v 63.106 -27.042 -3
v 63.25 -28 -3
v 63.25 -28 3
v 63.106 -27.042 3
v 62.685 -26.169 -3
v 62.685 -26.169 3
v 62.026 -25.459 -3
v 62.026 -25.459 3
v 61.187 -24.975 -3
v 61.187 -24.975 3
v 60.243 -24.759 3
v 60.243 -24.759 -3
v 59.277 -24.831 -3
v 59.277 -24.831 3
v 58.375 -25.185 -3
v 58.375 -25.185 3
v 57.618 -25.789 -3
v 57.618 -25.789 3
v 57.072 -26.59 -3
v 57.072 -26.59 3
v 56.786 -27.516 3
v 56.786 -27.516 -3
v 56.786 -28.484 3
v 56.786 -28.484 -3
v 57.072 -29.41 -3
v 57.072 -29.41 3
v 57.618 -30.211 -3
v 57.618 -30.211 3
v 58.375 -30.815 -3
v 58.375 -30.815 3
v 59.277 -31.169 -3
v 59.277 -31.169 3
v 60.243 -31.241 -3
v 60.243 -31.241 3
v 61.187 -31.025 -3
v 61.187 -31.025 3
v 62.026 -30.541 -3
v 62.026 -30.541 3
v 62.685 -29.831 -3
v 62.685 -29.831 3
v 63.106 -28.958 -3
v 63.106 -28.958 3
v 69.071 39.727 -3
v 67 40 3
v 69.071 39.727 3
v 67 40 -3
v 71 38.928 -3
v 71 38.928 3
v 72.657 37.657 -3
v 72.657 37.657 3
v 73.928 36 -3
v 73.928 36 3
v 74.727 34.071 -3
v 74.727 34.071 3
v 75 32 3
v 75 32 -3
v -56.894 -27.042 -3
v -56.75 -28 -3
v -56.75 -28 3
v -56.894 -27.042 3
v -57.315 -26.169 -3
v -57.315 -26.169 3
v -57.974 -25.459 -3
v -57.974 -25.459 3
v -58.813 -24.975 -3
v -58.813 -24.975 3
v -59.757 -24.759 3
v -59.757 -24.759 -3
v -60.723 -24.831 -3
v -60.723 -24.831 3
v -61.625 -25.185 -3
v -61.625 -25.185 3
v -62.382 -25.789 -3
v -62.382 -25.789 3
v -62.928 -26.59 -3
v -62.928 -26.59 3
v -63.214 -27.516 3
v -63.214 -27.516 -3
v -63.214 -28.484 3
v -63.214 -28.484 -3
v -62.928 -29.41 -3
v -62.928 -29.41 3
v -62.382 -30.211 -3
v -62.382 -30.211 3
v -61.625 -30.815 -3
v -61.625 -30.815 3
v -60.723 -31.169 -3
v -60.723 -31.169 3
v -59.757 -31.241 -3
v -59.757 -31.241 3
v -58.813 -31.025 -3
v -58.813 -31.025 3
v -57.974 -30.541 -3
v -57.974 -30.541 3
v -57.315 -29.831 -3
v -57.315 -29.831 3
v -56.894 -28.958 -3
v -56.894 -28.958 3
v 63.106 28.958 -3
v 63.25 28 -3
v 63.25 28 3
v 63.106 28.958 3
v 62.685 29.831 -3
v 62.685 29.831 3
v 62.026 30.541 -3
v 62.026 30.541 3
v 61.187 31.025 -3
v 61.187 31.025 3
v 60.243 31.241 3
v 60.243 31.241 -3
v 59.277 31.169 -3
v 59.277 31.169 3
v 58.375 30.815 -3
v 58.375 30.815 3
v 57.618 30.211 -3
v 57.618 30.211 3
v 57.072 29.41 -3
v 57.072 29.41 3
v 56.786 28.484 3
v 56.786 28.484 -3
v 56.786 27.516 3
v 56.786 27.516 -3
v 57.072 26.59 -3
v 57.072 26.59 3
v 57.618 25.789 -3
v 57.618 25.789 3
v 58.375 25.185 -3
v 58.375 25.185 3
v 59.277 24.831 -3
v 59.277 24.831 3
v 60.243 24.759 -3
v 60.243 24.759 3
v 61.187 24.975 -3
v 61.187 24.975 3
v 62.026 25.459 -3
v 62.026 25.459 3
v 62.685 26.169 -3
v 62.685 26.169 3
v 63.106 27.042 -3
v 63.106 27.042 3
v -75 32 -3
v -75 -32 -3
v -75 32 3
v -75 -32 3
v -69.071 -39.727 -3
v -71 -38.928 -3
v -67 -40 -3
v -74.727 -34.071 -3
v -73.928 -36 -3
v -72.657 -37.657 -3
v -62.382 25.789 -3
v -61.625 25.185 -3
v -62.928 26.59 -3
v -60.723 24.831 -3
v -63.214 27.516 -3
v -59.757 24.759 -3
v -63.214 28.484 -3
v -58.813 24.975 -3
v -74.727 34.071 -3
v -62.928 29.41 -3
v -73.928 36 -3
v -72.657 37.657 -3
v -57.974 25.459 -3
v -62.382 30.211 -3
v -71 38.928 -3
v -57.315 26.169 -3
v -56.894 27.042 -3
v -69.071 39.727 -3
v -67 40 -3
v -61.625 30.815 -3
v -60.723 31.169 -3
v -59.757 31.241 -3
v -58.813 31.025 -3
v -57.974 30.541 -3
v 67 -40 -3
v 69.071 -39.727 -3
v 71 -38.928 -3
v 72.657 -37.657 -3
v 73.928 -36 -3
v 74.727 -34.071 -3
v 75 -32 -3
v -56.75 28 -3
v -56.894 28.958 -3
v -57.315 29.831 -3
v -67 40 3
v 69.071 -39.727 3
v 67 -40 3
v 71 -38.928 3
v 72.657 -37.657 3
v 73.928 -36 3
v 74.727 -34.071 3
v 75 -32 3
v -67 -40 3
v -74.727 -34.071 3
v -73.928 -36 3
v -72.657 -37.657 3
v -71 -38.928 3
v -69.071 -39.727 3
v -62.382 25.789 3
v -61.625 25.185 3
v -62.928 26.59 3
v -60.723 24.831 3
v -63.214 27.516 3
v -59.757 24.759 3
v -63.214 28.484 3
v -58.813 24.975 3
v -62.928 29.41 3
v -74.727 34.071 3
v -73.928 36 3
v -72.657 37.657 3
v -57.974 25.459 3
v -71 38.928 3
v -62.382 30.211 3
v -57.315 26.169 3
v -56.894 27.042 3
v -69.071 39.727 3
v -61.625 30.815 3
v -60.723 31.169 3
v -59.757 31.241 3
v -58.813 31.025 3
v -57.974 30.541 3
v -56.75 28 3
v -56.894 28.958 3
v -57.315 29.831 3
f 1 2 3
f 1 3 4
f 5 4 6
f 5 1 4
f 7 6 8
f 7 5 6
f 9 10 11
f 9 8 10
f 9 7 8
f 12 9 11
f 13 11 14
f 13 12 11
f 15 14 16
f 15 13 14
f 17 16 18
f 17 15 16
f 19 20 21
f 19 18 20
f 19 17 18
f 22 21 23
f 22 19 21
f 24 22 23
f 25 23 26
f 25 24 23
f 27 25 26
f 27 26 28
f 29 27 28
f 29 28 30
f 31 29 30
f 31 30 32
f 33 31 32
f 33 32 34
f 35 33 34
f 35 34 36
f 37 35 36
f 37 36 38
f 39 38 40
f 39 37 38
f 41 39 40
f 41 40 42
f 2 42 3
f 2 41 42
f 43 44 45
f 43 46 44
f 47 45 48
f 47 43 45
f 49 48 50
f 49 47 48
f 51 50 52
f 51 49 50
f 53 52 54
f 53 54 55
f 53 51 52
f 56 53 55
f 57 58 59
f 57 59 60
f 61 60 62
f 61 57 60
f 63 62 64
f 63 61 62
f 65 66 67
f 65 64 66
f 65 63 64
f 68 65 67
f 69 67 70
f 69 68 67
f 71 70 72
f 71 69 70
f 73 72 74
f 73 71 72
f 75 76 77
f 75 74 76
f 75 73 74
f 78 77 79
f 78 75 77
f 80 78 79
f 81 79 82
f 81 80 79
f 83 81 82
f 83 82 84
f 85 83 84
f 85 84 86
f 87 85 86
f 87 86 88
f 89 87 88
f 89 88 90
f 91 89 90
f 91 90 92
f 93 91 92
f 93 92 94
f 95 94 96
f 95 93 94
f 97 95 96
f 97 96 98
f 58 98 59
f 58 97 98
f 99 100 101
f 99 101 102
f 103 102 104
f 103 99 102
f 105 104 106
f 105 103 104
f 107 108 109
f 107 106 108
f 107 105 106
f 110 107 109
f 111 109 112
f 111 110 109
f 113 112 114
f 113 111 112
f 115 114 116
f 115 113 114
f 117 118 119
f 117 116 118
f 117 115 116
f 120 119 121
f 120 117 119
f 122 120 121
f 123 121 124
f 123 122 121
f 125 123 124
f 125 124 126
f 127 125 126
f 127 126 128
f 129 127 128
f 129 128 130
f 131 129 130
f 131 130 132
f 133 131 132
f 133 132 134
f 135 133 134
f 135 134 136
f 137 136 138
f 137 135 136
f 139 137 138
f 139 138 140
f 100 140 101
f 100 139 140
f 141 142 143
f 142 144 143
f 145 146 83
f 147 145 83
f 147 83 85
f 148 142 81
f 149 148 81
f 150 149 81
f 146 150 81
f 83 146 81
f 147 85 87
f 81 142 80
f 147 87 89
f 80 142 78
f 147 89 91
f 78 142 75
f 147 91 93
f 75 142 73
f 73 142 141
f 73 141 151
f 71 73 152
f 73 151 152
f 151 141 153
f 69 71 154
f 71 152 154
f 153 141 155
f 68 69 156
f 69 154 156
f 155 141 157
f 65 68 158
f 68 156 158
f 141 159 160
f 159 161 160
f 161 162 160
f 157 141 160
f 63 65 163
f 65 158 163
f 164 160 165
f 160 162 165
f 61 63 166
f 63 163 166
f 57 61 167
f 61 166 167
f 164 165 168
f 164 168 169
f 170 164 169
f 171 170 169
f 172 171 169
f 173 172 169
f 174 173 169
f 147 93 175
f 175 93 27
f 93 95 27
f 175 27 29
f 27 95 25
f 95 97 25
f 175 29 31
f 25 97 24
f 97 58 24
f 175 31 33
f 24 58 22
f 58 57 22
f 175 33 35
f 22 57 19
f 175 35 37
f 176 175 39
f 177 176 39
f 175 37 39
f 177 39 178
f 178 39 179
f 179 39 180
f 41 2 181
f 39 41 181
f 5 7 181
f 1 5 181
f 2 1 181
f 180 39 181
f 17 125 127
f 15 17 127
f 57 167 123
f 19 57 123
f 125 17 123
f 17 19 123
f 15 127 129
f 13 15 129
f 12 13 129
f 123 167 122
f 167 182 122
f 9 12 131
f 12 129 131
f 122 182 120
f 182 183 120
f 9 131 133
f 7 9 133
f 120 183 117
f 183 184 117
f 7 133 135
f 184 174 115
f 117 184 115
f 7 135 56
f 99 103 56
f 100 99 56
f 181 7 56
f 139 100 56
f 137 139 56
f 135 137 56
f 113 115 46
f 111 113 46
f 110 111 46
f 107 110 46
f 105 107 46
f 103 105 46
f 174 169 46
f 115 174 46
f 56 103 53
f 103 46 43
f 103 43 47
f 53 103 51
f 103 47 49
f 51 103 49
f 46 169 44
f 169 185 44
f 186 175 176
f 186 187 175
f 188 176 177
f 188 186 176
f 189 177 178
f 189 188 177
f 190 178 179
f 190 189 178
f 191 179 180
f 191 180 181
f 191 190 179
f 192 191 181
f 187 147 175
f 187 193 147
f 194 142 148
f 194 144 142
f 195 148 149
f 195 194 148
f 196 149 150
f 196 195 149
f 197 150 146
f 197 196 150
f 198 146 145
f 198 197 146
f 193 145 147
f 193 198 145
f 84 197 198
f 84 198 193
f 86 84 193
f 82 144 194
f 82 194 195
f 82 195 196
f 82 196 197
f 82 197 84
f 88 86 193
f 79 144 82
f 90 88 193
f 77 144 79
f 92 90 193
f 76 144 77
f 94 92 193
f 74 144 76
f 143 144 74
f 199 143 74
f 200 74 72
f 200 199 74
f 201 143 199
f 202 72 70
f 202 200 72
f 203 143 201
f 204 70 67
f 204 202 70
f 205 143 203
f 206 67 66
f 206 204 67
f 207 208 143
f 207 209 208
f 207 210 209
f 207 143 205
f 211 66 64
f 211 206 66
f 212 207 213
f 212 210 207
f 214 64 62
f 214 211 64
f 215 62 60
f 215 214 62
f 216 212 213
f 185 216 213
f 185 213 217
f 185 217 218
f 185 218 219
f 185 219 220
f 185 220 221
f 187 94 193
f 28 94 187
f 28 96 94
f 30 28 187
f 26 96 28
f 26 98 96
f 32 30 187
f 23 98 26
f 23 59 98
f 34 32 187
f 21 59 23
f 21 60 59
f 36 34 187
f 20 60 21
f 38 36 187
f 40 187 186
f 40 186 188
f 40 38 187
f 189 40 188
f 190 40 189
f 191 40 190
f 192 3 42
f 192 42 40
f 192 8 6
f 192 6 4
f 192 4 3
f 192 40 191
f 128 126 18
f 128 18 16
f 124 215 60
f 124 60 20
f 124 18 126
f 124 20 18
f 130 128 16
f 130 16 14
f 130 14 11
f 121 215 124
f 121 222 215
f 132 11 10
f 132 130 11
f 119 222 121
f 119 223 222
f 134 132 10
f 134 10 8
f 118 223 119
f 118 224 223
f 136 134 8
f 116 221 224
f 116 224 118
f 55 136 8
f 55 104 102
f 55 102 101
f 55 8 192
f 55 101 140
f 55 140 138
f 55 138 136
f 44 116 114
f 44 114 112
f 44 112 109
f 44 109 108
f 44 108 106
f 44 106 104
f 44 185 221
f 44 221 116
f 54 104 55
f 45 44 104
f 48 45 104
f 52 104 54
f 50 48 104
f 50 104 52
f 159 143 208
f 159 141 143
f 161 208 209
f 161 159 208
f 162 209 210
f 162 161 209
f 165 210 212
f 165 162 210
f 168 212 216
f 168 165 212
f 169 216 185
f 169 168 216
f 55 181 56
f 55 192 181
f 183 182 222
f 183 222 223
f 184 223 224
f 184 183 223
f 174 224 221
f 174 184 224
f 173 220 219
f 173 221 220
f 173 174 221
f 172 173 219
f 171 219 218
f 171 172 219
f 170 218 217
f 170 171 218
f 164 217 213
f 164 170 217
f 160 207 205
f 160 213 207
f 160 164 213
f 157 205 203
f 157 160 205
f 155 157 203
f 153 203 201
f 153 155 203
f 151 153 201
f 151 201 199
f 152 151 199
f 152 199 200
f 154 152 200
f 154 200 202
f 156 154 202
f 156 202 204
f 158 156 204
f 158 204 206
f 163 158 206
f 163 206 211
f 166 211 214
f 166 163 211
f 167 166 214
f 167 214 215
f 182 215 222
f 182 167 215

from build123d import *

# Parameters (mm, degrees)
SKETCH2_W               = 150
SKETCH2_H               = 80
BOSS_EXTRUDE1_DEPTH     = 3
CUT_EXTRUDE1_DEPTH      = 86.211501571
CUT_EXTRUDE1_DEPTH_BACK = 86.211501571
SKETCH3_R               = 3.25
FILLET2_R               = 8


with BuildPart() as part:
    # Sketch2 → Boss-Extrude1 (new, symmetric)
    with BuildSketch(Plane.XY):
        Rectangle(SKETCH2_W, SKETCH2_H)
    extrude(amount=BOSS_EXTRUDE1_DEPTH, both=True)

    # Sketch3 → Cut-Extrude1 (cut, two sides: drawn at the far end of the back side and taken through both)
    with BuildSketch(Plane.XY.offset(3).offset(-CUT_EXTRUDE1_DEPTH_BACK)):
        with Locations((-60, 28)):
            Circle(SKETCH3_R)
        with Locations((-60, -28)):
            Circle(SKETCH3_R)
        with Locations((60, -28)):
            Circle(SKETCH3_R)
        with Locations((60, 28)):
            Circle(SKETCH3_R)
    extrude(amount=CUT_EXTRUDE1_DEPTH + CUT_EXTRUDE1_DEPTH_BACK, mode=Mode.SUBTRACT)

    # Fillet2
    fillet2_edges = [part.edges().sort_by_distance(p)[0] for p in [
        (75, -40, 0),
        (-75, -40, 0),
        (-75, 40, 0),
        (75, 40, 0),
    ]]
    fillet(fillet2_edges, radius=FILLET2_R)


solid = part.part
